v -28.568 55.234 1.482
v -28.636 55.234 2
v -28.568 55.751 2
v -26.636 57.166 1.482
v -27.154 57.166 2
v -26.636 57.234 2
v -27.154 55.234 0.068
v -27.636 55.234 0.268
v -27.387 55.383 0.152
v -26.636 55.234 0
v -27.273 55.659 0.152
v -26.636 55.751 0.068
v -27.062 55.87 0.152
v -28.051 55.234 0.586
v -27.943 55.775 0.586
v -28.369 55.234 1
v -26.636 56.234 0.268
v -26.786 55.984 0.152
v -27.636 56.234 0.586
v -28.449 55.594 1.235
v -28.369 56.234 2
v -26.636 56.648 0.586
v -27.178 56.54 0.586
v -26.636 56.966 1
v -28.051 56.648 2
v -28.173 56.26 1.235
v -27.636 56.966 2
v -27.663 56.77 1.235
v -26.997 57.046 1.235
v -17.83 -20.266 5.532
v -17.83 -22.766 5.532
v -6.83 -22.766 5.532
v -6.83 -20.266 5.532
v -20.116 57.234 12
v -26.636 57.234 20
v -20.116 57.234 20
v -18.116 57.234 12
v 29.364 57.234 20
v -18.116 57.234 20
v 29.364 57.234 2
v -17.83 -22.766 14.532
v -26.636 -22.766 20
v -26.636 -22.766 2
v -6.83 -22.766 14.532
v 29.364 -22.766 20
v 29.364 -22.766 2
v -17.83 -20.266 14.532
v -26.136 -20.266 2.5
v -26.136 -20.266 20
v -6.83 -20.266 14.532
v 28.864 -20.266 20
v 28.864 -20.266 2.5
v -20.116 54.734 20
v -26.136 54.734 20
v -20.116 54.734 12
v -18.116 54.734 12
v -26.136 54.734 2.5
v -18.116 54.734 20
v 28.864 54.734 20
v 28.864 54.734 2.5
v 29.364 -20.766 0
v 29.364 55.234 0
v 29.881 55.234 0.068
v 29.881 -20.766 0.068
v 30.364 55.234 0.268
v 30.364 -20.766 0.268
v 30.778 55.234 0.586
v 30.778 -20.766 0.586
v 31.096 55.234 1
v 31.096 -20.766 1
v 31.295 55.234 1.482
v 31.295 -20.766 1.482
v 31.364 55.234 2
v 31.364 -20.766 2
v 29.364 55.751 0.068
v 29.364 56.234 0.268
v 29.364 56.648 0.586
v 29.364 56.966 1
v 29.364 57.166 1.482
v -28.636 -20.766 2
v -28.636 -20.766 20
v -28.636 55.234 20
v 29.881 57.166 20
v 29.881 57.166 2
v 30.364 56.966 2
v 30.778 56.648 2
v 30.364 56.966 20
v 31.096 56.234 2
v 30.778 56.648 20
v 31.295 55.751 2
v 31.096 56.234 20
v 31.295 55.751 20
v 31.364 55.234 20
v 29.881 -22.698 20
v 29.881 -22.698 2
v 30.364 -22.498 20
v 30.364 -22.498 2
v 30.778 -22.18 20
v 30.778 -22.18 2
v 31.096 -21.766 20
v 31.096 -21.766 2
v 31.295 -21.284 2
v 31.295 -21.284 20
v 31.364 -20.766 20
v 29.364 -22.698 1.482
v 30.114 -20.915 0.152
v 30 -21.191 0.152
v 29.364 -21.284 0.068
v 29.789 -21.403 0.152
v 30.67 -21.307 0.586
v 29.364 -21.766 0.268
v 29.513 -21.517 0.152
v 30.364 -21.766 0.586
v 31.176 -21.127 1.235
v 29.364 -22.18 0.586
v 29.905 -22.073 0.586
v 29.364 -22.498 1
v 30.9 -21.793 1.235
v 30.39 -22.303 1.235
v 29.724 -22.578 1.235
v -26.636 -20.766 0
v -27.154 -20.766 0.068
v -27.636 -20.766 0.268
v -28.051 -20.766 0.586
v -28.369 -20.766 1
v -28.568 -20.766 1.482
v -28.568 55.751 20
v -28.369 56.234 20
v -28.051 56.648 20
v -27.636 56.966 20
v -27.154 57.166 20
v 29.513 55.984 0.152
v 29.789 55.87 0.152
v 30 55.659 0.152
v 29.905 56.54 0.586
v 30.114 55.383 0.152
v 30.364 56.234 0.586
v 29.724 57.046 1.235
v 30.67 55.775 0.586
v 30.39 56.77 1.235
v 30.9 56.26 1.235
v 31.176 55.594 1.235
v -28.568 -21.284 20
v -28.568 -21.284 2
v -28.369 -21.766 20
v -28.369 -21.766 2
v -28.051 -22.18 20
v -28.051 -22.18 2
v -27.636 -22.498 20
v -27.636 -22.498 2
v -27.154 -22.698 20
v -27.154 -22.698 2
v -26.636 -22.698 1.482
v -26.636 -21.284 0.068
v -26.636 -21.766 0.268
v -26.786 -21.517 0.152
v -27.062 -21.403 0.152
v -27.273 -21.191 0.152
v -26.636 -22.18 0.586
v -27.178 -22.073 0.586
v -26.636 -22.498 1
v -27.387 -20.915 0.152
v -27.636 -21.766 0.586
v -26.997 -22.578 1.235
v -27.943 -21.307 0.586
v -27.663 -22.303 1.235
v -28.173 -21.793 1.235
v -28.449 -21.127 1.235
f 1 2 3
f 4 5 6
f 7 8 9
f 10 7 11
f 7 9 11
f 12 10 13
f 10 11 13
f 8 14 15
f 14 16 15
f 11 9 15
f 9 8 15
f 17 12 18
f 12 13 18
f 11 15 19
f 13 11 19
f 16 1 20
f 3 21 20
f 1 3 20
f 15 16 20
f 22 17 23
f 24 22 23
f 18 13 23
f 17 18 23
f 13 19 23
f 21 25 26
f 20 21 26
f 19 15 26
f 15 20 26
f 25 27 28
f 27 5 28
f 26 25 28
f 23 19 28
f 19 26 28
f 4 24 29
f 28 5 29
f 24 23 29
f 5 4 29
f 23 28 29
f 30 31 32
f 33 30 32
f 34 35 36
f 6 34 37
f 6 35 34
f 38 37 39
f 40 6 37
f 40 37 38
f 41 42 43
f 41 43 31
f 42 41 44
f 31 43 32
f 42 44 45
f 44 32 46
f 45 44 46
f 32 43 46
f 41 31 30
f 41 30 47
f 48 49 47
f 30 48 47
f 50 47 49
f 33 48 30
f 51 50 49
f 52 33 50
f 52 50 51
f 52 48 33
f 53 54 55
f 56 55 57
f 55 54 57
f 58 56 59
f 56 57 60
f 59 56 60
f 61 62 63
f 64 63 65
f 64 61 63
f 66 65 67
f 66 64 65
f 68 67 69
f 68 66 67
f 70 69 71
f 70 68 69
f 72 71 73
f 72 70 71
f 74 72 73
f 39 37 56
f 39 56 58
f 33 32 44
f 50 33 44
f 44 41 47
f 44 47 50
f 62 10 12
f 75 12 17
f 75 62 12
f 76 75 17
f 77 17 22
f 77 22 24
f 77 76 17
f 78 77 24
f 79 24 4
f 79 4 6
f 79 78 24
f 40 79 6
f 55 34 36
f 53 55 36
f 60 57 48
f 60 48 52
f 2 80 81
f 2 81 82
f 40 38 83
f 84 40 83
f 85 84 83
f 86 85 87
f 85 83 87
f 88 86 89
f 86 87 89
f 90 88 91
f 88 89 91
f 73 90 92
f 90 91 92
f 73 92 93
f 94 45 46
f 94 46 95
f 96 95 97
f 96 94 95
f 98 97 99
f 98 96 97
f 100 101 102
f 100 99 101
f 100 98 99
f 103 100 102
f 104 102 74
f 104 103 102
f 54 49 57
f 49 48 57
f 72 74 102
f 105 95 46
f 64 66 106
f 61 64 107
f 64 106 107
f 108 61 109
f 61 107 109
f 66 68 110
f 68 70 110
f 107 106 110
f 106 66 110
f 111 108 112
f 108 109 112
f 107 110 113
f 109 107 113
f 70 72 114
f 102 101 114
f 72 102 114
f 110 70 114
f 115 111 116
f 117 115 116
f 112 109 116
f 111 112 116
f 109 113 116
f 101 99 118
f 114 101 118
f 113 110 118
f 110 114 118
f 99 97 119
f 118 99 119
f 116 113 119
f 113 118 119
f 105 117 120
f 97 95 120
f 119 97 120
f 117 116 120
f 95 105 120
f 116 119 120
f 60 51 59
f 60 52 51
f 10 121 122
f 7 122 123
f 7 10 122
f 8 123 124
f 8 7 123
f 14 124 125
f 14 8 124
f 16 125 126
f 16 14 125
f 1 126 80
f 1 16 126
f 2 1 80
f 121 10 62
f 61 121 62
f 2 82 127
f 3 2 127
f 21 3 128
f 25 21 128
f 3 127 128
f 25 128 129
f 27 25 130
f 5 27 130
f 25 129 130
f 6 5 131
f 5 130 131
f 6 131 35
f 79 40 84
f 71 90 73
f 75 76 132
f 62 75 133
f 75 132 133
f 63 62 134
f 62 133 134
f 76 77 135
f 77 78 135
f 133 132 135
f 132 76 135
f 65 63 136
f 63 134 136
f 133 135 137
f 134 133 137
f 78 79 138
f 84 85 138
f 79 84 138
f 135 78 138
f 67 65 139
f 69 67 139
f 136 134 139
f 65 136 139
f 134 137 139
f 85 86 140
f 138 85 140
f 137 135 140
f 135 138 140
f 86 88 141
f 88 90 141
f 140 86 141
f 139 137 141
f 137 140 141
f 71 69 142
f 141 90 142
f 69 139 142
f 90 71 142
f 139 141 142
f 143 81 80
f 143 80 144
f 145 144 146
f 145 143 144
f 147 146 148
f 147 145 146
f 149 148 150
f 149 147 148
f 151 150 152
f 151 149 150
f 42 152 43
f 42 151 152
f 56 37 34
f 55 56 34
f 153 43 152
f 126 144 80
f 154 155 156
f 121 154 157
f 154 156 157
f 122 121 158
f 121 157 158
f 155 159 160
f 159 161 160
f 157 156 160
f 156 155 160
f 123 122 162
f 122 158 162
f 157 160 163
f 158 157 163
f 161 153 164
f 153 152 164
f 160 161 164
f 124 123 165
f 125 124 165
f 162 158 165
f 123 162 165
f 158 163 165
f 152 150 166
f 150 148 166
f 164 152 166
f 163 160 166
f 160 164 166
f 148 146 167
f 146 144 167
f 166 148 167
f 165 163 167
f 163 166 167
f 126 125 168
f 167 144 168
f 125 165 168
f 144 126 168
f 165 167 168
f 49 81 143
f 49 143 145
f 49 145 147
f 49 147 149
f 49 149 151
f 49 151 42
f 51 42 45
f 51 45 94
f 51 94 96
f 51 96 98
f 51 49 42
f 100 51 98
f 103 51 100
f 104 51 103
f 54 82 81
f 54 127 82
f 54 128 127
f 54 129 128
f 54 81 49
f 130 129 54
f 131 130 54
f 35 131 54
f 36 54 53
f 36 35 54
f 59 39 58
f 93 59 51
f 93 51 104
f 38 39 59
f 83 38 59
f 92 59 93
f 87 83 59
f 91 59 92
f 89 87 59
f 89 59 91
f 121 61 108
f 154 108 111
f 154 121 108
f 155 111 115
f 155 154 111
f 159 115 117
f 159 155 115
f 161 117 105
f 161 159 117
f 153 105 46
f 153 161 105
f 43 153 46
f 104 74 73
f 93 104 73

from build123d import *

# Parameters (mm, degrees)
F0_W     = 60
F0_H     = 80
F1_DEPTH = 20
F2_T     = -2.5
F3_W     = 11
F3_H     = 9
F4_DEPTH = 10
F5_W     = 2
F5_H     = 8
F6_DEPTH = 25
F7_R     = 2
F8_R     = 2


with BuildPart() as f1:
    # F0 (on Top) → F1 (new body)
    with BuildSketch(Plane.XY):
        with Locations((1.363532, 17.233828)):
            Rectangle(F0_W, F0_H)
    extrude(amount=F1_DEPTH)

    # F2
    f2_openings = [f1.faces().sort_by_distance(p)[0] for p in [
        (1.363532, 17.233828, 20),
    ]]
    offset(amount=F2_T, openings=f2_openings)

    # F3 (on face) → F4 (cut)
    with BuildSketch(Plane.XZ.offset(22.766172)):
        with Locations((-12.330356, 10.031623)):
            Rectangle(F3_W, F3_H)
    extrude(amount=-F4_DEPTH, mode=Mode.SUBTRACT)

    # F5 (on face) → F6 (cut)
    with BuildSketch(Plane(origin=(0, 57.233828, 0), x_dir=(-1, 0, 0), z_dir=(0, 1, 0))):
        with Locations((19.115507, 16)):
            Rectangle(F5_W, F5_H)
    extrude(amount=-F6_DEPTH, mode=Mode.SUBTRACT)

    # F7
    f7_edges = [f1.edges().sort_by_distance(p)[0] for p in [
        (31.363532, -22.766172, 10),
        (31.363532, 57.233828, 10),
        (-28.636468, 57.233828, 10),
        (-28.636468, -22.766172, 10),
    ]]
    fillet(f7_edges, radius=F7_R)

    # F8
    f8_edges = [f1.edges().sort_by_distance(p)[0] for p in [
        (1.363532, 57.233828, 0),
        (30.777745, 56.648042, 0),
        (-28.050682, 56.648042, 0),
        (31.363532, 17.233828, 0),
        (-28.636468, 17.233828, 0),
        (30.777745, -22.180386, 0),
        (-28.050682, -22.180386, 0),
        (1.363532, -22.766172, 0),
    ]]
    fillet(f8_edges, radius=F8_R)


solid = f1.part
